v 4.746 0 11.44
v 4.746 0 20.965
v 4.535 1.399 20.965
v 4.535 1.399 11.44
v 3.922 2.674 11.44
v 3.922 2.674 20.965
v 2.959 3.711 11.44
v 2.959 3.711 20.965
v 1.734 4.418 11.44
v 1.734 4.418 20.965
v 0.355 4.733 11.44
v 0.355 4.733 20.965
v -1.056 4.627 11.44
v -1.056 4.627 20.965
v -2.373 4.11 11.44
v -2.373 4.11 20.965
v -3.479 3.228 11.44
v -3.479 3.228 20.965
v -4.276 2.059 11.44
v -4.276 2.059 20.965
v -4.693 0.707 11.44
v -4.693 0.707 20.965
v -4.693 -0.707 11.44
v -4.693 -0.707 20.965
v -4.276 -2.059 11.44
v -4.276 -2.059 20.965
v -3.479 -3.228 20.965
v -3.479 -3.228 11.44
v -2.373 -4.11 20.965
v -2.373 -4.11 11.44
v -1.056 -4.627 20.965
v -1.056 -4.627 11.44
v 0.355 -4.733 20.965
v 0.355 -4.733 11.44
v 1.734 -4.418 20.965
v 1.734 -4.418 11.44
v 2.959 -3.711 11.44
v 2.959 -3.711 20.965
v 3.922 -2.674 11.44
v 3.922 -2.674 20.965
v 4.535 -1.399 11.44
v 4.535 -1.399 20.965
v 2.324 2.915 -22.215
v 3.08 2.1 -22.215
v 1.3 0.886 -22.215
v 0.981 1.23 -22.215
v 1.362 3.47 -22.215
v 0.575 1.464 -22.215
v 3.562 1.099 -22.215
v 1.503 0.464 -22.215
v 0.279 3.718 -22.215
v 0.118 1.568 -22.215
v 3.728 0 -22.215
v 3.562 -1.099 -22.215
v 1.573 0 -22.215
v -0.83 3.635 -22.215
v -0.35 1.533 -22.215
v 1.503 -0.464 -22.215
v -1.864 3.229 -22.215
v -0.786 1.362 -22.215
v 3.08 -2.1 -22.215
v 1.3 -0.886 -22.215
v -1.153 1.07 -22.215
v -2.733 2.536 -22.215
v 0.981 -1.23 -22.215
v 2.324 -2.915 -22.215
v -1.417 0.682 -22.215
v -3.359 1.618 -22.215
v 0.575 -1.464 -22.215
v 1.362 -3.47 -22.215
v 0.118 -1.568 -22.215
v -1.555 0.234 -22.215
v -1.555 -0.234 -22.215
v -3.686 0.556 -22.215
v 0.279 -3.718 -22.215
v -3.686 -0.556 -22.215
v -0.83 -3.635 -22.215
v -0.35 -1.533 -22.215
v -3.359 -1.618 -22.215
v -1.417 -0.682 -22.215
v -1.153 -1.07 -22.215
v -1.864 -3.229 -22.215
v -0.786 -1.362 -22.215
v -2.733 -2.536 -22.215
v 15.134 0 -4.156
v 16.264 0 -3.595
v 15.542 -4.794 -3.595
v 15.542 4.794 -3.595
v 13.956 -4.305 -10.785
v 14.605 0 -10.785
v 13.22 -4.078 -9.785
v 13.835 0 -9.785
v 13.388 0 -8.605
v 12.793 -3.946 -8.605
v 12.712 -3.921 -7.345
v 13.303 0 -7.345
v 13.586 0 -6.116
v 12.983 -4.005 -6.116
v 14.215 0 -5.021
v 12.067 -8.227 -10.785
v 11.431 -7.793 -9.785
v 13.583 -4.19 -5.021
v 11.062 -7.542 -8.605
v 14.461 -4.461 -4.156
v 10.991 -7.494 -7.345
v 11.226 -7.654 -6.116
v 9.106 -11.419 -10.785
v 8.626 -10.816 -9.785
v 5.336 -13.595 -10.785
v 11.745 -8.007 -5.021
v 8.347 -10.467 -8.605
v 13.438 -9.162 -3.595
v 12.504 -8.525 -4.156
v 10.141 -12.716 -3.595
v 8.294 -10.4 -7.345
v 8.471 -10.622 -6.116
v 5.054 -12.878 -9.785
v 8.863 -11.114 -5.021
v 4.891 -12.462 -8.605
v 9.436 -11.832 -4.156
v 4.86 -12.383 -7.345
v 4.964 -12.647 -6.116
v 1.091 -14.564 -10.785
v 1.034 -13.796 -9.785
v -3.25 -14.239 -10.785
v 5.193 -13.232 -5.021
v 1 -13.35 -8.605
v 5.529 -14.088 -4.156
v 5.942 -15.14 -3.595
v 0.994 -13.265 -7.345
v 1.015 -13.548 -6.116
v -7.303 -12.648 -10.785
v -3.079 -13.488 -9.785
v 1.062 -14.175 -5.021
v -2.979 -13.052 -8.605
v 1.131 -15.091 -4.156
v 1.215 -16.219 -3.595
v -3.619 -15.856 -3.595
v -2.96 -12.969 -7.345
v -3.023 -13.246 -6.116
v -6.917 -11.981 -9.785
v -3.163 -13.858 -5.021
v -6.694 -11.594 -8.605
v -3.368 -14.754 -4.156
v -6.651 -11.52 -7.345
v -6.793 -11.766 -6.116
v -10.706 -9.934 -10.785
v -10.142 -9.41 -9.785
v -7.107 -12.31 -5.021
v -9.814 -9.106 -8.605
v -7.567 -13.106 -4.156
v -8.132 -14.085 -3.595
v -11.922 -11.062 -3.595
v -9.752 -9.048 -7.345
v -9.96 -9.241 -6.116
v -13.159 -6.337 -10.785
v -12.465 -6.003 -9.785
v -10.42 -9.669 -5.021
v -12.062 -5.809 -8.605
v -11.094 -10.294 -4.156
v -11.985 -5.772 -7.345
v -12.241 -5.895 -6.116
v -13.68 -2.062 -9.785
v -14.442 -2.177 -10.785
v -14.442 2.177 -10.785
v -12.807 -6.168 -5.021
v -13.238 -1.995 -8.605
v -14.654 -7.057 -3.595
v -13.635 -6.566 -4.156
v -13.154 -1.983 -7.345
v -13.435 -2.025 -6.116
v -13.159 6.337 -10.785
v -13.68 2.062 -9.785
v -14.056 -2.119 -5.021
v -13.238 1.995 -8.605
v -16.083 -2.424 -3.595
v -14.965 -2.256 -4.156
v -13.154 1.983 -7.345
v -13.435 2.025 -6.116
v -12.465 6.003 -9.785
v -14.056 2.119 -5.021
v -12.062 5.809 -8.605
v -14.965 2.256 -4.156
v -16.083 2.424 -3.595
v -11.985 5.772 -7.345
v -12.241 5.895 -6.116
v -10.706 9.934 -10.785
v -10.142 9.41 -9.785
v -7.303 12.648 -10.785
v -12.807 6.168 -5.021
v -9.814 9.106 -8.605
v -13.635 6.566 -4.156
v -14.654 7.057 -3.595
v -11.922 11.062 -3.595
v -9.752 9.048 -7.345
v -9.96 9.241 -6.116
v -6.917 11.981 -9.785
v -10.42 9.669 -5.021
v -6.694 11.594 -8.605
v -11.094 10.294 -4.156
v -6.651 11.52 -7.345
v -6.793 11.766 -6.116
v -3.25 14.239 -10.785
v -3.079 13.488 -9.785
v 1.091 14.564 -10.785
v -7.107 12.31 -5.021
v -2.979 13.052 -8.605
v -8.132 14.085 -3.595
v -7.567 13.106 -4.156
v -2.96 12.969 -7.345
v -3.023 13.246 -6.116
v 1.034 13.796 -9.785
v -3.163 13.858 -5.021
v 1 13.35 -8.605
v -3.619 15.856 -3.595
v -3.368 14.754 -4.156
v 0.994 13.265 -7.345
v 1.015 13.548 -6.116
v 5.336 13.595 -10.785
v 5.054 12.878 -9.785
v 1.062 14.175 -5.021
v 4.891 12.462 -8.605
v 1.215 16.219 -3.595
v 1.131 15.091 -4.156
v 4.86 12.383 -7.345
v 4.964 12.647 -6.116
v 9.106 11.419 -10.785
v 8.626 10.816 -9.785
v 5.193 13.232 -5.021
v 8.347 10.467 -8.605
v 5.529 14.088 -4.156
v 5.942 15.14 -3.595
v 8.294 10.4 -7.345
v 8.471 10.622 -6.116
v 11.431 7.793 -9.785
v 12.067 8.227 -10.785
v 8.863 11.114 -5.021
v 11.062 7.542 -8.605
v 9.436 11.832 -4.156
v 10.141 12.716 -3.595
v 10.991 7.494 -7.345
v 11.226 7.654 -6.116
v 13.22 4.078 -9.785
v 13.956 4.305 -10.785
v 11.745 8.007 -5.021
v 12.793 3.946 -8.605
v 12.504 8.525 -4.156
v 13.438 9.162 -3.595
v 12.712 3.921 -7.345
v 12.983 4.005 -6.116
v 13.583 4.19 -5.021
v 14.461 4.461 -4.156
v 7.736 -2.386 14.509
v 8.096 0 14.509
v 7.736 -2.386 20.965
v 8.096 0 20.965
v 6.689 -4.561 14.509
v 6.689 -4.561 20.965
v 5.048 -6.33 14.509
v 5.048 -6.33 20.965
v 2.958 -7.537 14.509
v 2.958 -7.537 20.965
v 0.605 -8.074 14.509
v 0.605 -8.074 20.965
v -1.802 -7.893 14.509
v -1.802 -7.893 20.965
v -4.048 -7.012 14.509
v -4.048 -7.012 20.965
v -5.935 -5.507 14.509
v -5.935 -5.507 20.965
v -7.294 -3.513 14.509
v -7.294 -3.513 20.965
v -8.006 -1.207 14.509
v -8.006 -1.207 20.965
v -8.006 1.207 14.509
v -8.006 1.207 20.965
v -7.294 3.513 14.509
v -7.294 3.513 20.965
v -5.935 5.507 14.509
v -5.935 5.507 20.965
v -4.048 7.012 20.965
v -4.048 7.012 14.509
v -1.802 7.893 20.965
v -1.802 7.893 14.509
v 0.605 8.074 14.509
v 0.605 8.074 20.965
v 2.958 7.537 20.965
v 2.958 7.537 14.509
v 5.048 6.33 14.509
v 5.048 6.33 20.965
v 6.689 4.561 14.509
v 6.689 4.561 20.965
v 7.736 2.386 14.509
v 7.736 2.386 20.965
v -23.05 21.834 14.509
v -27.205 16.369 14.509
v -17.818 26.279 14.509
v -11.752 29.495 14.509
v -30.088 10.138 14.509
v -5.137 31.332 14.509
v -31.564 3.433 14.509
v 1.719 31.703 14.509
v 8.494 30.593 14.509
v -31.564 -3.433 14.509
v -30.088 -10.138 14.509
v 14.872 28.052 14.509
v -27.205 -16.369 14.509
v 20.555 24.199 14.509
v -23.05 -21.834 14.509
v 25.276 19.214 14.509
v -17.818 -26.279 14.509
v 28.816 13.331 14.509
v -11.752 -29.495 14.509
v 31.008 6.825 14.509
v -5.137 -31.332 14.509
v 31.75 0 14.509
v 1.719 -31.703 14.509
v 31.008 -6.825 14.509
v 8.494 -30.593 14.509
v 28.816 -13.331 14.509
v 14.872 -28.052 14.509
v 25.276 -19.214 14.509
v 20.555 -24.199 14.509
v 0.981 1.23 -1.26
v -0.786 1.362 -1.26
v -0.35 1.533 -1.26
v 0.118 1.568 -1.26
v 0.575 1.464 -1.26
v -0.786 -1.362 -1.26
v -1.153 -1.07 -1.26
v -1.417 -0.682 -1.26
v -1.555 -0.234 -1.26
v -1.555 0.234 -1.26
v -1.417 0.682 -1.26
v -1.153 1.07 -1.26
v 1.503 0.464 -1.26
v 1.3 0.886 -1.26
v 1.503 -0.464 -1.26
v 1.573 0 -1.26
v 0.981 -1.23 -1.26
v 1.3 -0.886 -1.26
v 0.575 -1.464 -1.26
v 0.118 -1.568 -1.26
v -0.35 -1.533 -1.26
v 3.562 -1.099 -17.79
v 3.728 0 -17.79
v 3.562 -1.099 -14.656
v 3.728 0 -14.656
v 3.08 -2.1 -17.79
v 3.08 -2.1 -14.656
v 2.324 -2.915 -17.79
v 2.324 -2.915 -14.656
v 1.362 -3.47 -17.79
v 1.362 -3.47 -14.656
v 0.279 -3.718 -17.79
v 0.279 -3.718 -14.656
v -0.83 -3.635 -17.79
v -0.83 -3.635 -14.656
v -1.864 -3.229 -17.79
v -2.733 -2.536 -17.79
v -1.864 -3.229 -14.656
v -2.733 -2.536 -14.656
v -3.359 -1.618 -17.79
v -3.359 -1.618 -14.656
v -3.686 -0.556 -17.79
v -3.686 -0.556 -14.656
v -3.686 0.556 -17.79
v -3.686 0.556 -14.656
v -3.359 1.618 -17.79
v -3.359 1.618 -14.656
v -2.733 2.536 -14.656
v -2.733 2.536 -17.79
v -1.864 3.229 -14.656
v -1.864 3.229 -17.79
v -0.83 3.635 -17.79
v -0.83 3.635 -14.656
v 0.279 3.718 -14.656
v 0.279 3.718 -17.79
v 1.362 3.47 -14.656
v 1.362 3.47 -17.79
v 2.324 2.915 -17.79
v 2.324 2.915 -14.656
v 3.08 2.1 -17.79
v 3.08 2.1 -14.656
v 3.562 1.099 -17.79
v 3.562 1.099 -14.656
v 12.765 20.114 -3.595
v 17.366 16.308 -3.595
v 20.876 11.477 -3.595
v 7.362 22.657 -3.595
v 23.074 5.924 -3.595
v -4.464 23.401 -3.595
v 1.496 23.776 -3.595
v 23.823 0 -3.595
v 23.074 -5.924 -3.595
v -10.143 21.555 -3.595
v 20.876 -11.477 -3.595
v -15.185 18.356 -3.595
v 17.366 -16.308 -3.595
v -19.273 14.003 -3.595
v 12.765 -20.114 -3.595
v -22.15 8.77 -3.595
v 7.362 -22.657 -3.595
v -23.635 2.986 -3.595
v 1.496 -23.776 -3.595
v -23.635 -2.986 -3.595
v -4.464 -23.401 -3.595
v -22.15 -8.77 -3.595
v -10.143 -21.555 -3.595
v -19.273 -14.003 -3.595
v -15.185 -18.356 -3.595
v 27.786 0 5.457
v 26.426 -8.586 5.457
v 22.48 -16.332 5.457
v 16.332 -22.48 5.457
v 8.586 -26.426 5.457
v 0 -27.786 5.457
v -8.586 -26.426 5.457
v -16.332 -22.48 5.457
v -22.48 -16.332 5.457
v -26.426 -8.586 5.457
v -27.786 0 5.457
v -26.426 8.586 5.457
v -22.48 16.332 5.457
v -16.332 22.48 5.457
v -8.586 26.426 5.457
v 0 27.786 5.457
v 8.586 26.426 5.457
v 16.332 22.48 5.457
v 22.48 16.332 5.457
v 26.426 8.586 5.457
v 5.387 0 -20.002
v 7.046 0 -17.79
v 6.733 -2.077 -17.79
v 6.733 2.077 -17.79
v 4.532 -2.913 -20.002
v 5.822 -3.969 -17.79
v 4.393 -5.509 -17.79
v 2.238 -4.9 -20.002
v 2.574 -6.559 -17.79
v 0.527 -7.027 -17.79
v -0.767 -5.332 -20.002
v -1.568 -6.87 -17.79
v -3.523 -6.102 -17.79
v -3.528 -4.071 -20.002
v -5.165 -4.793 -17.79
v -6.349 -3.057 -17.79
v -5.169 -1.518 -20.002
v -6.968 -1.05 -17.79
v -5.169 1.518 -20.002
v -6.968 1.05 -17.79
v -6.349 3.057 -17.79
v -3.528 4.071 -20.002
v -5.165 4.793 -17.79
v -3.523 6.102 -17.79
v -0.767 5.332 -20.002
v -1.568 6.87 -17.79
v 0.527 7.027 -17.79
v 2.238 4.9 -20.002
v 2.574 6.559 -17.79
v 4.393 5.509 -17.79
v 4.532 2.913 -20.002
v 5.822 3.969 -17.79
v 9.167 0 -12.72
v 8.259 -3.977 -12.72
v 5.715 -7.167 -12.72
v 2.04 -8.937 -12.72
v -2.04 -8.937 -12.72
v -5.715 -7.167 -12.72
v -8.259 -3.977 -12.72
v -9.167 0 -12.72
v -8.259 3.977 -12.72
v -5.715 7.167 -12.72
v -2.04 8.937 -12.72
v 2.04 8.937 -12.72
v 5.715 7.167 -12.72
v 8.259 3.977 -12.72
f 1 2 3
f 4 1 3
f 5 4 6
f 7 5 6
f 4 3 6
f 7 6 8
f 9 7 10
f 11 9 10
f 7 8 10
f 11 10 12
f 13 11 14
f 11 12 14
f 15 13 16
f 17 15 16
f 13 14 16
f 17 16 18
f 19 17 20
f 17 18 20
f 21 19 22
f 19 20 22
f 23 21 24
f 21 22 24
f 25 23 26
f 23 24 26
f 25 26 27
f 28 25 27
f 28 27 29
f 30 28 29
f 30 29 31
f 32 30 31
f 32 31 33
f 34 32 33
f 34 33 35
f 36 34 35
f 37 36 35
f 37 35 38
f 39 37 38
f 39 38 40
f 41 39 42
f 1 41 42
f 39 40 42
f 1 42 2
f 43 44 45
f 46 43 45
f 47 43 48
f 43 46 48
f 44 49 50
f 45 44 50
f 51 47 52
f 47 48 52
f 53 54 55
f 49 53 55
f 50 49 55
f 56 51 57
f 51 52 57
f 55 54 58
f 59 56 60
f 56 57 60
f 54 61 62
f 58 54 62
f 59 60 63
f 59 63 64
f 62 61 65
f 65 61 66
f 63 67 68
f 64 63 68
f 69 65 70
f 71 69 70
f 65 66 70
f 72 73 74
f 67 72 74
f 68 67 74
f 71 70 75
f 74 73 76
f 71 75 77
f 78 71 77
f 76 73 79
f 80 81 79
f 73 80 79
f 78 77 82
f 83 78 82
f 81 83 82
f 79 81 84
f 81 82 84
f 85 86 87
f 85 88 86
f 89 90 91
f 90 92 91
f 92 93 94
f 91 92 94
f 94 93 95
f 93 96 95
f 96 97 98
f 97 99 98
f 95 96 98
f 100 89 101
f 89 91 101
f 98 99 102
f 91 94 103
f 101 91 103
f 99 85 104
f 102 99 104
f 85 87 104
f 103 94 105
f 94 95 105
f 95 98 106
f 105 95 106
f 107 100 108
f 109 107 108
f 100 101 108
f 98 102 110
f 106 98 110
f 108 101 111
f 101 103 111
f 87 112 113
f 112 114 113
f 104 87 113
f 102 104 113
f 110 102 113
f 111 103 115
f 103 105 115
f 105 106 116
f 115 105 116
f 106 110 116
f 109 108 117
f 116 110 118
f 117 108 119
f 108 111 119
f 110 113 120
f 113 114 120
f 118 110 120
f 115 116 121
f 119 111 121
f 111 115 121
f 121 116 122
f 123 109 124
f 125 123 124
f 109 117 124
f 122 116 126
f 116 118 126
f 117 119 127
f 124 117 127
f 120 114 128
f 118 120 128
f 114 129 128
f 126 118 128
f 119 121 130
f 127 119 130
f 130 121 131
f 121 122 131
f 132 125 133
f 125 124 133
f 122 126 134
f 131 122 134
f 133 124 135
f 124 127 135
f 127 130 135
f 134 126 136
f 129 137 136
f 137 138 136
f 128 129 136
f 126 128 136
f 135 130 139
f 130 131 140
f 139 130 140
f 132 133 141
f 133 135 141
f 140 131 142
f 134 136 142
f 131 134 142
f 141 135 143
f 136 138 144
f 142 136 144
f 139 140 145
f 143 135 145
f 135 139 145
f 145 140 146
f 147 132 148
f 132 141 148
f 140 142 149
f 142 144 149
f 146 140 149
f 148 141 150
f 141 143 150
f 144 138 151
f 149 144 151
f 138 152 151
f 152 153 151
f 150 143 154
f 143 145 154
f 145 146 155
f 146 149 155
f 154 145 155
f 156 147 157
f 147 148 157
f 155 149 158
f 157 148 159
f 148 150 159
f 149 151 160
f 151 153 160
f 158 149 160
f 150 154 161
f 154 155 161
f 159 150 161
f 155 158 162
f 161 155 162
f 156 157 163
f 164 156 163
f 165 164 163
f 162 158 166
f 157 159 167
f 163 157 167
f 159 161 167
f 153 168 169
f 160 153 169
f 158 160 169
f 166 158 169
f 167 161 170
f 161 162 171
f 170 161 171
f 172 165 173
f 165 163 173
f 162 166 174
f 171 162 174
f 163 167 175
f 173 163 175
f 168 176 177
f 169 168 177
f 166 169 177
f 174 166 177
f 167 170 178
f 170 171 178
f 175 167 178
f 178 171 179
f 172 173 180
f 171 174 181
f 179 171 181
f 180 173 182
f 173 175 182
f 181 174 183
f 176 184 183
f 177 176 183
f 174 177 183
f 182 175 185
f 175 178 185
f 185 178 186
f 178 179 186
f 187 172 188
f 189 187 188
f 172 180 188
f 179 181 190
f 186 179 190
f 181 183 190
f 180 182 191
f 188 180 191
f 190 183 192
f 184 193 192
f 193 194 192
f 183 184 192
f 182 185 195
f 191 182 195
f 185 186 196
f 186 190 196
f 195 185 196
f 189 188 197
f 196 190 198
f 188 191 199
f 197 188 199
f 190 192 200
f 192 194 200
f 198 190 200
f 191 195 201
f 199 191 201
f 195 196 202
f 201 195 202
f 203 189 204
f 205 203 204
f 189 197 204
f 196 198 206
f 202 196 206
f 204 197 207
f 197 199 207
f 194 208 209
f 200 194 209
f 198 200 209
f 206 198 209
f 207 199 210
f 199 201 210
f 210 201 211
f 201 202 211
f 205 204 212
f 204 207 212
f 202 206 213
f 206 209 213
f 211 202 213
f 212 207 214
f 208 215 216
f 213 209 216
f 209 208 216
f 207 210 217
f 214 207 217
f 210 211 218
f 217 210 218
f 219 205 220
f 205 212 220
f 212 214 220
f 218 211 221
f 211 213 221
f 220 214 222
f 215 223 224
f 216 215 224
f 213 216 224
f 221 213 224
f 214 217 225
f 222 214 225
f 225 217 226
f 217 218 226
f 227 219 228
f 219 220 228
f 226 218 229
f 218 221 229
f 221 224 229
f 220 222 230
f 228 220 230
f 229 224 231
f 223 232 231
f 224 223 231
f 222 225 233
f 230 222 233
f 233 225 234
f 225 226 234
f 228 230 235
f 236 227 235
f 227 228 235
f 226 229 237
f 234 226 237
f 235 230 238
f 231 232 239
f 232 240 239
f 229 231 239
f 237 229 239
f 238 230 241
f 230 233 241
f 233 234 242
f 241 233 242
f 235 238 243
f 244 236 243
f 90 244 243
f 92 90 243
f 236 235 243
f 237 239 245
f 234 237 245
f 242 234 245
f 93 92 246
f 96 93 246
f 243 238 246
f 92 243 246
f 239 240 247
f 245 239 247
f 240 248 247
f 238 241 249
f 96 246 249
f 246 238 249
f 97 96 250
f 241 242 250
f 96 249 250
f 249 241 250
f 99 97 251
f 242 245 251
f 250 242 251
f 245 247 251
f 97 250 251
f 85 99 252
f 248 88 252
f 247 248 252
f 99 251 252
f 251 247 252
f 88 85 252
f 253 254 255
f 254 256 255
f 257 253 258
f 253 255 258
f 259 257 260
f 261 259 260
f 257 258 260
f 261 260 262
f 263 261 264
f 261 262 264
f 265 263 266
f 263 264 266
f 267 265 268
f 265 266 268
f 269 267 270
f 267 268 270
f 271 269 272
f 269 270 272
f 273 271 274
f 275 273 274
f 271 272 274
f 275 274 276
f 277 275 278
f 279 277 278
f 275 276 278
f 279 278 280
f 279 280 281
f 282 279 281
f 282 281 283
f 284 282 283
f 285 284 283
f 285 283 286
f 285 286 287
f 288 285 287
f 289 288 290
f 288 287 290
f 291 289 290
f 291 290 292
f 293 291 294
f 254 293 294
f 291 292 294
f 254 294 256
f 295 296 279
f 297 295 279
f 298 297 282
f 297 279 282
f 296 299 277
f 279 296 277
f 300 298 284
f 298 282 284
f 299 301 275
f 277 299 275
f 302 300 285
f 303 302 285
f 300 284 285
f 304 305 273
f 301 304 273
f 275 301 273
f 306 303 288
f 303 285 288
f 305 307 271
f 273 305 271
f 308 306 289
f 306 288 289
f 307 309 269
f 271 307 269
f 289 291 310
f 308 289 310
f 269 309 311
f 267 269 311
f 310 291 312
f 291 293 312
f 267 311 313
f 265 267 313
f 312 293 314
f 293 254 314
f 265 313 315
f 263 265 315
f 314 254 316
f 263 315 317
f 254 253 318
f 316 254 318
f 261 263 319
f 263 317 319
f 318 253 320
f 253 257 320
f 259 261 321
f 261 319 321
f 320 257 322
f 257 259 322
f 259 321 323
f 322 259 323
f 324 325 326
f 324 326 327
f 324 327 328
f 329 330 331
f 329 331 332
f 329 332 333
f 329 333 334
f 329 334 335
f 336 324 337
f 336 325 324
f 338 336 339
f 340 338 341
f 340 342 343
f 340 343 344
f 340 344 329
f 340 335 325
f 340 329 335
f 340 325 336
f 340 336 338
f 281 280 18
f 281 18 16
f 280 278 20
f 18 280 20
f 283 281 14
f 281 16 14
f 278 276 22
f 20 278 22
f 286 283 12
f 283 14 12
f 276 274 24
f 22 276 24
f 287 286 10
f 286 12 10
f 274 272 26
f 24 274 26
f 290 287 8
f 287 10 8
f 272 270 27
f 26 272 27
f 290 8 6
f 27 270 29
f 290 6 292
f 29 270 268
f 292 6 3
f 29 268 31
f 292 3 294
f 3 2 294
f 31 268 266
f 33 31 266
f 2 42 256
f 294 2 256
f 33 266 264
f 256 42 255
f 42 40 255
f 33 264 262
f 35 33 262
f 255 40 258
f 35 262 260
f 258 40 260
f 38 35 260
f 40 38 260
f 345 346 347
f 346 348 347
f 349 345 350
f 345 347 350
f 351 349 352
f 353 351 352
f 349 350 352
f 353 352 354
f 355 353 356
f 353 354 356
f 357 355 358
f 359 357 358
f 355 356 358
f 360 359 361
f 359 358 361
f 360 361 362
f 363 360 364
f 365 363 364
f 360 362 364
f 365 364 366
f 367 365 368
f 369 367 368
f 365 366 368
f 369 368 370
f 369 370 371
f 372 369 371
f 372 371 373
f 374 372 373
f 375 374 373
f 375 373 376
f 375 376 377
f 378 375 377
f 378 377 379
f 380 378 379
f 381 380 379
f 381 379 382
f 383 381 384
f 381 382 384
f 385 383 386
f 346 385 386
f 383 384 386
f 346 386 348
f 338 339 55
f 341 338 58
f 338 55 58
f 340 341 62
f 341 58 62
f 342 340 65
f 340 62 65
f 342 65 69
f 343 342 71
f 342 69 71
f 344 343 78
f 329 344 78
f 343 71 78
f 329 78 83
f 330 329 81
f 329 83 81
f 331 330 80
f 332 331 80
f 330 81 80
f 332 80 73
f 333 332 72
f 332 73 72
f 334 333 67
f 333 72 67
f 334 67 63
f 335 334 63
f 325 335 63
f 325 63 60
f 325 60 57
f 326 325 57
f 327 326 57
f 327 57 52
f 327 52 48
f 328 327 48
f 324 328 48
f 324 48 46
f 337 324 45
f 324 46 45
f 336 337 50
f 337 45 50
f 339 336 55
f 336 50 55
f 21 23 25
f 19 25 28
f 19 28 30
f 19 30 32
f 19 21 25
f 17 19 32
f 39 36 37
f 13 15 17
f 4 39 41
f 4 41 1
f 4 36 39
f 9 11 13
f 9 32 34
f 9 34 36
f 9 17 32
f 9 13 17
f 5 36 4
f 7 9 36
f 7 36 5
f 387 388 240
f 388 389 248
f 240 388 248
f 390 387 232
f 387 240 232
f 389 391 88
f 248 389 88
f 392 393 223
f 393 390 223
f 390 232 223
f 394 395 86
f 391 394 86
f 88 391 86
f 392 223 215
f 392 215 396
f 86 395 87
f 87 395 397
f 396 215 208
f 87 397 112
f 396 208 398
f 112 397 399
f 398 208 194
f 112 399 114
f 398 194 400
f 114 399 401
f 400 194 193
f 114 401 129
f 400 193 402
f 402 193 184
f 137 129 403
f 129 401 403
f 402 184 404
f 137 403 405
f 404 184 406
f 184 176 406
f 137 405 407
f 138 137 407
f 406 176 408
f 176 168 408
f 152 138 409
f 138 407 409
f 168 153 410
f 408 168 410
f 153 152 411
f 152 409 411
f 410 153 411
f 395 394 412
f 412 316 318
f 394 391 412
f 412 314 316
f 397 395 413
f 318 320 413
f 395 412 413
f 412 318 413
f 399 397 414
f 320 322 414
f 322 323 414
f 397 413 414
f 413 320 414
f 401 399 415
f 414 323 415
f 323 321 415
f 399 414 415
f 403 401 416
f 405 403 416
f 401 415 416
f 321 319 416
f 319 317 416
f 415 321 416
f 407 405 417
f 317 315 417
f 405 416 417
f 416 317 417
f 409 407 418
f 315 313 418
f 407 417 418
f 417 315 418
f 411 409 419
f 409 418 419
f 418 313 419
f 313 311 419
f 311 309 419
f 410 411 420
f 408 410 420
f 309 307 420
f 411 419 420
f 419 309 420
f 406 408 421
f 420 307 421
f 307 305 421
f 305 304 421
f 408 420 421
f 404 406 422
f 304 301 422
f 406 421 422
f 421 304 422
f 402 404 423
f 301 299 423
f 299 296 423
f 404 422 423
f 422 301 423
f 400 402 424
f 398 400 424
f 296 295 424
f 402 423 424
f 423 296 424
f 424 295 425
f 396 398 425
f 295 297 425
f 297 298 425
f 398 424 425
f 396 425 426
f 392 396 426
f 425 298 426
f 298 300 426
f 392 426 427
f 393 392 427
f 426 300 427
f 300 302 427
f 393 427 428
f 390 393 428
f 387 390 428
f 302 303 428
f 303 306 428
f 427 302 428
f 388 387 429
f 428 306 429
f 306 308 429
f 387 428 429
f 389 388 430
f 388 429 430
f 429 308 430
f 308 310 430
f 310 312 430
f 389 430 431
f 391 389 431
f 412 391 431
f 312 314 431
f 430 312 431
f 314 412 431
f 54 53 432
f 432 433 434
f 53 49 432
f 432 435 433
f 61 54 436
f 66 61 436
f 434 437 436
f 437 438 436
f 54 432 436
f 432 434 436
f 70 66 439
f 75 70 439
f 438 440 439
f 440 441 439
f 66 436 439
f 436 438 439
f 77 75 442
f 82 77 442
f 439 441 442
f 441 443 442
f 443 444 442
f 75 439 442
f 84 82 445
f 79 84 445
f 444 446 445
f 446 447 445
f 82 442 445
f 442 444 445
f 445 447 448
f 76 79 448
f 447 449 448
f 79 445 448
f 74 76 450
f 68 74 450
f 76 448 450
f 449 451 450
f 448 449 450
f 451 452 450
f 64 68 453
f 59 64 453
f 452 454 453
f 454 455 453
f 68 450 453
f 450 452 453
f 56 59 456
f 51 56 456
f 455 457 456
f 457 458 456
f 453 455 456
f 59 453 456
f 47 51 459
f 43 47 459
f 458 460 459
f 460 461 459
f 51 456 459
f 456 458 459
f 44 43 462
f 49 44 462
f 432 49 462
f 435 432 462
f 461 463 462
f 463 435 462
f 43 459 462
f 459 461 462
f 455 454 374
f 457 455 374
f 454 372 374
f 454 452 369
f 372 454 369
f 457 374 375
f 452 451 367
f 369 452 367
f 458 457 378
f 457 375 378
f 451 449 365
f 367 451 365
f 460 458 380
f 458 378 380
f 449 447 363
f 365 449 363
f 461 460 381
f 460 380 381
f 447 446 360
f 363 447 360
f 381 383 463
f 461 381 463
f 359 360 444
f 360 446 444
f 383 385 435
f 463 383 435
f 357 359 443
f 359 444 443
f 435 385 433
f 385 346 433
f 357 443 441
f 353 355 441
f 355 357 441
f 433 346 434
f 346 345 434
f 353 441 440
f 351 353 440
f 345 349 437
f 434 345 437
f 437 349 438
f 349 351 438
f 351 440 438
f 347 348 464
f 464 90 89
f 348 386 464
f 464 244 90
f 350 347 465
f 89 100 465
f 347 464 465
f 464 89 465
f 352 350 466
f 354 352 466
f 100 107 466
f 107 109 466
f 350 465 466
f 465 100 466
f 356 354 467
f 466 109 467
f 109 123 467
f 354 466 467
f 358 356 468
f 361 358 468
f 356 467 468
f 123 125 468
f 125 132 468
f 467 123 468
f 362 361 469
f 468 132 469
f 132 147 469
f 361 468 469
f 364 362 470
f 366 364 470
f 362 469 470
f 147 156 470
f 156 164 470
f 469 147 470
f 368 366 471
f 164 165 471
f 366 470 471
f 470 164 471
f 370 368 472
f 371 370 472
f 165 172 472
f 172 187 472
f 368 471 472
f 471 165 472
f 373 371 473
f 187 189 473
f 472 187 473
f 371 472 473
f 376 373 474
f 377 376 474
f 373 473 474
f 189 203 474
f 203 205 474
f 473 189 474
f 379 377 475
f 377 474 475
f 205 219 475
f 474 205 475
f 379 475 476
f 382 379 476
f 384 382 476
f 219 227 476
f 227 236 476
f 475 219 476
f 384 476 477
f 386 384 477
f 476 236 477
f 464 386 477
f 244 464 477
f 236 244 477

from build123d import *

# Parameters (mm, degrees)
F2_R     = 1.5728770132
F3_DEPTH = 20.955
F4_R     = 4.7463390005
F5_DEPTH = 9.525


# Not quite as in the source:
# - a feature names something its author has since deleted; it is built from what else it names


with BuildPart() as f1:
    # F0 (on Front) → F1 (revolve)
    with BuildSketch(Plane.XZ):
        with BuildLine():
            Line((0, 20.9652427214), (0, 6.7289513536))
            Line((0, 6.7289513536), (0, -22.2147572786))
            Line((0, -22.2147572786), (3.7280632295, -22.2147572786))
            Line((3.7280632295, -22.2147572786), (7.0464526415, -17.7902411669))
            Line((7.0464526415, -17.7902411669), (3.7280632295, -17.7902411669))
            Line((3.7280632295, -17.7902411669), (3.7280632295, -14.6562093869))
            Line((3.7280632295, -14.6562093869), (14.6050014645, -10.7847582549))
            ThreePointArc((14.6050014645, -10.7847582549), (13.3991858149, -6.7201295533), (16.2641917467, -3.5949193407))
            Line((16.2641917467, -3.5949193407), (23.8227405697, -3.5949193407))
            Line((23.8227405697, -3.5949193407), (31.75, 14.5086767152))
            Line((31.75, 14.5086767152), (14.6050014645, 14.5086767152))
            Line((14.6050014645, 14.5086767152), (8.0961844996, 14.5086767152))
            Line((8.0961844996, 14.5086767152), (8.0961844996, 20.9652427214))
            Line((8.0961844996, 20.9652427214), (0, 20.9652427214))
        make_face()
    revolve(axis=Axis((0, 0, -7.7429029625), (0, 0, -1)))

    # F2 (on face) → F3 (cut)
    with BuildSketch(Plane(origin=(0, 0, -22.2147572786), x_dir=(1, 0, 0), z_dir=(0, 0, -1))):
        Circle(F2_R)
    extrude(amount=-F3_DEPTH, mode=Mode.SUBTRACT)

    # F4 (on face) → F5 (cut)
    with BuildSketch(Plane.XY.offset(20.9652427214)):
        Circle(F4_R)
    extrude(amount=-F5_DEPTH, mode=Mode.SUBTRACT)


solid = f1.part
